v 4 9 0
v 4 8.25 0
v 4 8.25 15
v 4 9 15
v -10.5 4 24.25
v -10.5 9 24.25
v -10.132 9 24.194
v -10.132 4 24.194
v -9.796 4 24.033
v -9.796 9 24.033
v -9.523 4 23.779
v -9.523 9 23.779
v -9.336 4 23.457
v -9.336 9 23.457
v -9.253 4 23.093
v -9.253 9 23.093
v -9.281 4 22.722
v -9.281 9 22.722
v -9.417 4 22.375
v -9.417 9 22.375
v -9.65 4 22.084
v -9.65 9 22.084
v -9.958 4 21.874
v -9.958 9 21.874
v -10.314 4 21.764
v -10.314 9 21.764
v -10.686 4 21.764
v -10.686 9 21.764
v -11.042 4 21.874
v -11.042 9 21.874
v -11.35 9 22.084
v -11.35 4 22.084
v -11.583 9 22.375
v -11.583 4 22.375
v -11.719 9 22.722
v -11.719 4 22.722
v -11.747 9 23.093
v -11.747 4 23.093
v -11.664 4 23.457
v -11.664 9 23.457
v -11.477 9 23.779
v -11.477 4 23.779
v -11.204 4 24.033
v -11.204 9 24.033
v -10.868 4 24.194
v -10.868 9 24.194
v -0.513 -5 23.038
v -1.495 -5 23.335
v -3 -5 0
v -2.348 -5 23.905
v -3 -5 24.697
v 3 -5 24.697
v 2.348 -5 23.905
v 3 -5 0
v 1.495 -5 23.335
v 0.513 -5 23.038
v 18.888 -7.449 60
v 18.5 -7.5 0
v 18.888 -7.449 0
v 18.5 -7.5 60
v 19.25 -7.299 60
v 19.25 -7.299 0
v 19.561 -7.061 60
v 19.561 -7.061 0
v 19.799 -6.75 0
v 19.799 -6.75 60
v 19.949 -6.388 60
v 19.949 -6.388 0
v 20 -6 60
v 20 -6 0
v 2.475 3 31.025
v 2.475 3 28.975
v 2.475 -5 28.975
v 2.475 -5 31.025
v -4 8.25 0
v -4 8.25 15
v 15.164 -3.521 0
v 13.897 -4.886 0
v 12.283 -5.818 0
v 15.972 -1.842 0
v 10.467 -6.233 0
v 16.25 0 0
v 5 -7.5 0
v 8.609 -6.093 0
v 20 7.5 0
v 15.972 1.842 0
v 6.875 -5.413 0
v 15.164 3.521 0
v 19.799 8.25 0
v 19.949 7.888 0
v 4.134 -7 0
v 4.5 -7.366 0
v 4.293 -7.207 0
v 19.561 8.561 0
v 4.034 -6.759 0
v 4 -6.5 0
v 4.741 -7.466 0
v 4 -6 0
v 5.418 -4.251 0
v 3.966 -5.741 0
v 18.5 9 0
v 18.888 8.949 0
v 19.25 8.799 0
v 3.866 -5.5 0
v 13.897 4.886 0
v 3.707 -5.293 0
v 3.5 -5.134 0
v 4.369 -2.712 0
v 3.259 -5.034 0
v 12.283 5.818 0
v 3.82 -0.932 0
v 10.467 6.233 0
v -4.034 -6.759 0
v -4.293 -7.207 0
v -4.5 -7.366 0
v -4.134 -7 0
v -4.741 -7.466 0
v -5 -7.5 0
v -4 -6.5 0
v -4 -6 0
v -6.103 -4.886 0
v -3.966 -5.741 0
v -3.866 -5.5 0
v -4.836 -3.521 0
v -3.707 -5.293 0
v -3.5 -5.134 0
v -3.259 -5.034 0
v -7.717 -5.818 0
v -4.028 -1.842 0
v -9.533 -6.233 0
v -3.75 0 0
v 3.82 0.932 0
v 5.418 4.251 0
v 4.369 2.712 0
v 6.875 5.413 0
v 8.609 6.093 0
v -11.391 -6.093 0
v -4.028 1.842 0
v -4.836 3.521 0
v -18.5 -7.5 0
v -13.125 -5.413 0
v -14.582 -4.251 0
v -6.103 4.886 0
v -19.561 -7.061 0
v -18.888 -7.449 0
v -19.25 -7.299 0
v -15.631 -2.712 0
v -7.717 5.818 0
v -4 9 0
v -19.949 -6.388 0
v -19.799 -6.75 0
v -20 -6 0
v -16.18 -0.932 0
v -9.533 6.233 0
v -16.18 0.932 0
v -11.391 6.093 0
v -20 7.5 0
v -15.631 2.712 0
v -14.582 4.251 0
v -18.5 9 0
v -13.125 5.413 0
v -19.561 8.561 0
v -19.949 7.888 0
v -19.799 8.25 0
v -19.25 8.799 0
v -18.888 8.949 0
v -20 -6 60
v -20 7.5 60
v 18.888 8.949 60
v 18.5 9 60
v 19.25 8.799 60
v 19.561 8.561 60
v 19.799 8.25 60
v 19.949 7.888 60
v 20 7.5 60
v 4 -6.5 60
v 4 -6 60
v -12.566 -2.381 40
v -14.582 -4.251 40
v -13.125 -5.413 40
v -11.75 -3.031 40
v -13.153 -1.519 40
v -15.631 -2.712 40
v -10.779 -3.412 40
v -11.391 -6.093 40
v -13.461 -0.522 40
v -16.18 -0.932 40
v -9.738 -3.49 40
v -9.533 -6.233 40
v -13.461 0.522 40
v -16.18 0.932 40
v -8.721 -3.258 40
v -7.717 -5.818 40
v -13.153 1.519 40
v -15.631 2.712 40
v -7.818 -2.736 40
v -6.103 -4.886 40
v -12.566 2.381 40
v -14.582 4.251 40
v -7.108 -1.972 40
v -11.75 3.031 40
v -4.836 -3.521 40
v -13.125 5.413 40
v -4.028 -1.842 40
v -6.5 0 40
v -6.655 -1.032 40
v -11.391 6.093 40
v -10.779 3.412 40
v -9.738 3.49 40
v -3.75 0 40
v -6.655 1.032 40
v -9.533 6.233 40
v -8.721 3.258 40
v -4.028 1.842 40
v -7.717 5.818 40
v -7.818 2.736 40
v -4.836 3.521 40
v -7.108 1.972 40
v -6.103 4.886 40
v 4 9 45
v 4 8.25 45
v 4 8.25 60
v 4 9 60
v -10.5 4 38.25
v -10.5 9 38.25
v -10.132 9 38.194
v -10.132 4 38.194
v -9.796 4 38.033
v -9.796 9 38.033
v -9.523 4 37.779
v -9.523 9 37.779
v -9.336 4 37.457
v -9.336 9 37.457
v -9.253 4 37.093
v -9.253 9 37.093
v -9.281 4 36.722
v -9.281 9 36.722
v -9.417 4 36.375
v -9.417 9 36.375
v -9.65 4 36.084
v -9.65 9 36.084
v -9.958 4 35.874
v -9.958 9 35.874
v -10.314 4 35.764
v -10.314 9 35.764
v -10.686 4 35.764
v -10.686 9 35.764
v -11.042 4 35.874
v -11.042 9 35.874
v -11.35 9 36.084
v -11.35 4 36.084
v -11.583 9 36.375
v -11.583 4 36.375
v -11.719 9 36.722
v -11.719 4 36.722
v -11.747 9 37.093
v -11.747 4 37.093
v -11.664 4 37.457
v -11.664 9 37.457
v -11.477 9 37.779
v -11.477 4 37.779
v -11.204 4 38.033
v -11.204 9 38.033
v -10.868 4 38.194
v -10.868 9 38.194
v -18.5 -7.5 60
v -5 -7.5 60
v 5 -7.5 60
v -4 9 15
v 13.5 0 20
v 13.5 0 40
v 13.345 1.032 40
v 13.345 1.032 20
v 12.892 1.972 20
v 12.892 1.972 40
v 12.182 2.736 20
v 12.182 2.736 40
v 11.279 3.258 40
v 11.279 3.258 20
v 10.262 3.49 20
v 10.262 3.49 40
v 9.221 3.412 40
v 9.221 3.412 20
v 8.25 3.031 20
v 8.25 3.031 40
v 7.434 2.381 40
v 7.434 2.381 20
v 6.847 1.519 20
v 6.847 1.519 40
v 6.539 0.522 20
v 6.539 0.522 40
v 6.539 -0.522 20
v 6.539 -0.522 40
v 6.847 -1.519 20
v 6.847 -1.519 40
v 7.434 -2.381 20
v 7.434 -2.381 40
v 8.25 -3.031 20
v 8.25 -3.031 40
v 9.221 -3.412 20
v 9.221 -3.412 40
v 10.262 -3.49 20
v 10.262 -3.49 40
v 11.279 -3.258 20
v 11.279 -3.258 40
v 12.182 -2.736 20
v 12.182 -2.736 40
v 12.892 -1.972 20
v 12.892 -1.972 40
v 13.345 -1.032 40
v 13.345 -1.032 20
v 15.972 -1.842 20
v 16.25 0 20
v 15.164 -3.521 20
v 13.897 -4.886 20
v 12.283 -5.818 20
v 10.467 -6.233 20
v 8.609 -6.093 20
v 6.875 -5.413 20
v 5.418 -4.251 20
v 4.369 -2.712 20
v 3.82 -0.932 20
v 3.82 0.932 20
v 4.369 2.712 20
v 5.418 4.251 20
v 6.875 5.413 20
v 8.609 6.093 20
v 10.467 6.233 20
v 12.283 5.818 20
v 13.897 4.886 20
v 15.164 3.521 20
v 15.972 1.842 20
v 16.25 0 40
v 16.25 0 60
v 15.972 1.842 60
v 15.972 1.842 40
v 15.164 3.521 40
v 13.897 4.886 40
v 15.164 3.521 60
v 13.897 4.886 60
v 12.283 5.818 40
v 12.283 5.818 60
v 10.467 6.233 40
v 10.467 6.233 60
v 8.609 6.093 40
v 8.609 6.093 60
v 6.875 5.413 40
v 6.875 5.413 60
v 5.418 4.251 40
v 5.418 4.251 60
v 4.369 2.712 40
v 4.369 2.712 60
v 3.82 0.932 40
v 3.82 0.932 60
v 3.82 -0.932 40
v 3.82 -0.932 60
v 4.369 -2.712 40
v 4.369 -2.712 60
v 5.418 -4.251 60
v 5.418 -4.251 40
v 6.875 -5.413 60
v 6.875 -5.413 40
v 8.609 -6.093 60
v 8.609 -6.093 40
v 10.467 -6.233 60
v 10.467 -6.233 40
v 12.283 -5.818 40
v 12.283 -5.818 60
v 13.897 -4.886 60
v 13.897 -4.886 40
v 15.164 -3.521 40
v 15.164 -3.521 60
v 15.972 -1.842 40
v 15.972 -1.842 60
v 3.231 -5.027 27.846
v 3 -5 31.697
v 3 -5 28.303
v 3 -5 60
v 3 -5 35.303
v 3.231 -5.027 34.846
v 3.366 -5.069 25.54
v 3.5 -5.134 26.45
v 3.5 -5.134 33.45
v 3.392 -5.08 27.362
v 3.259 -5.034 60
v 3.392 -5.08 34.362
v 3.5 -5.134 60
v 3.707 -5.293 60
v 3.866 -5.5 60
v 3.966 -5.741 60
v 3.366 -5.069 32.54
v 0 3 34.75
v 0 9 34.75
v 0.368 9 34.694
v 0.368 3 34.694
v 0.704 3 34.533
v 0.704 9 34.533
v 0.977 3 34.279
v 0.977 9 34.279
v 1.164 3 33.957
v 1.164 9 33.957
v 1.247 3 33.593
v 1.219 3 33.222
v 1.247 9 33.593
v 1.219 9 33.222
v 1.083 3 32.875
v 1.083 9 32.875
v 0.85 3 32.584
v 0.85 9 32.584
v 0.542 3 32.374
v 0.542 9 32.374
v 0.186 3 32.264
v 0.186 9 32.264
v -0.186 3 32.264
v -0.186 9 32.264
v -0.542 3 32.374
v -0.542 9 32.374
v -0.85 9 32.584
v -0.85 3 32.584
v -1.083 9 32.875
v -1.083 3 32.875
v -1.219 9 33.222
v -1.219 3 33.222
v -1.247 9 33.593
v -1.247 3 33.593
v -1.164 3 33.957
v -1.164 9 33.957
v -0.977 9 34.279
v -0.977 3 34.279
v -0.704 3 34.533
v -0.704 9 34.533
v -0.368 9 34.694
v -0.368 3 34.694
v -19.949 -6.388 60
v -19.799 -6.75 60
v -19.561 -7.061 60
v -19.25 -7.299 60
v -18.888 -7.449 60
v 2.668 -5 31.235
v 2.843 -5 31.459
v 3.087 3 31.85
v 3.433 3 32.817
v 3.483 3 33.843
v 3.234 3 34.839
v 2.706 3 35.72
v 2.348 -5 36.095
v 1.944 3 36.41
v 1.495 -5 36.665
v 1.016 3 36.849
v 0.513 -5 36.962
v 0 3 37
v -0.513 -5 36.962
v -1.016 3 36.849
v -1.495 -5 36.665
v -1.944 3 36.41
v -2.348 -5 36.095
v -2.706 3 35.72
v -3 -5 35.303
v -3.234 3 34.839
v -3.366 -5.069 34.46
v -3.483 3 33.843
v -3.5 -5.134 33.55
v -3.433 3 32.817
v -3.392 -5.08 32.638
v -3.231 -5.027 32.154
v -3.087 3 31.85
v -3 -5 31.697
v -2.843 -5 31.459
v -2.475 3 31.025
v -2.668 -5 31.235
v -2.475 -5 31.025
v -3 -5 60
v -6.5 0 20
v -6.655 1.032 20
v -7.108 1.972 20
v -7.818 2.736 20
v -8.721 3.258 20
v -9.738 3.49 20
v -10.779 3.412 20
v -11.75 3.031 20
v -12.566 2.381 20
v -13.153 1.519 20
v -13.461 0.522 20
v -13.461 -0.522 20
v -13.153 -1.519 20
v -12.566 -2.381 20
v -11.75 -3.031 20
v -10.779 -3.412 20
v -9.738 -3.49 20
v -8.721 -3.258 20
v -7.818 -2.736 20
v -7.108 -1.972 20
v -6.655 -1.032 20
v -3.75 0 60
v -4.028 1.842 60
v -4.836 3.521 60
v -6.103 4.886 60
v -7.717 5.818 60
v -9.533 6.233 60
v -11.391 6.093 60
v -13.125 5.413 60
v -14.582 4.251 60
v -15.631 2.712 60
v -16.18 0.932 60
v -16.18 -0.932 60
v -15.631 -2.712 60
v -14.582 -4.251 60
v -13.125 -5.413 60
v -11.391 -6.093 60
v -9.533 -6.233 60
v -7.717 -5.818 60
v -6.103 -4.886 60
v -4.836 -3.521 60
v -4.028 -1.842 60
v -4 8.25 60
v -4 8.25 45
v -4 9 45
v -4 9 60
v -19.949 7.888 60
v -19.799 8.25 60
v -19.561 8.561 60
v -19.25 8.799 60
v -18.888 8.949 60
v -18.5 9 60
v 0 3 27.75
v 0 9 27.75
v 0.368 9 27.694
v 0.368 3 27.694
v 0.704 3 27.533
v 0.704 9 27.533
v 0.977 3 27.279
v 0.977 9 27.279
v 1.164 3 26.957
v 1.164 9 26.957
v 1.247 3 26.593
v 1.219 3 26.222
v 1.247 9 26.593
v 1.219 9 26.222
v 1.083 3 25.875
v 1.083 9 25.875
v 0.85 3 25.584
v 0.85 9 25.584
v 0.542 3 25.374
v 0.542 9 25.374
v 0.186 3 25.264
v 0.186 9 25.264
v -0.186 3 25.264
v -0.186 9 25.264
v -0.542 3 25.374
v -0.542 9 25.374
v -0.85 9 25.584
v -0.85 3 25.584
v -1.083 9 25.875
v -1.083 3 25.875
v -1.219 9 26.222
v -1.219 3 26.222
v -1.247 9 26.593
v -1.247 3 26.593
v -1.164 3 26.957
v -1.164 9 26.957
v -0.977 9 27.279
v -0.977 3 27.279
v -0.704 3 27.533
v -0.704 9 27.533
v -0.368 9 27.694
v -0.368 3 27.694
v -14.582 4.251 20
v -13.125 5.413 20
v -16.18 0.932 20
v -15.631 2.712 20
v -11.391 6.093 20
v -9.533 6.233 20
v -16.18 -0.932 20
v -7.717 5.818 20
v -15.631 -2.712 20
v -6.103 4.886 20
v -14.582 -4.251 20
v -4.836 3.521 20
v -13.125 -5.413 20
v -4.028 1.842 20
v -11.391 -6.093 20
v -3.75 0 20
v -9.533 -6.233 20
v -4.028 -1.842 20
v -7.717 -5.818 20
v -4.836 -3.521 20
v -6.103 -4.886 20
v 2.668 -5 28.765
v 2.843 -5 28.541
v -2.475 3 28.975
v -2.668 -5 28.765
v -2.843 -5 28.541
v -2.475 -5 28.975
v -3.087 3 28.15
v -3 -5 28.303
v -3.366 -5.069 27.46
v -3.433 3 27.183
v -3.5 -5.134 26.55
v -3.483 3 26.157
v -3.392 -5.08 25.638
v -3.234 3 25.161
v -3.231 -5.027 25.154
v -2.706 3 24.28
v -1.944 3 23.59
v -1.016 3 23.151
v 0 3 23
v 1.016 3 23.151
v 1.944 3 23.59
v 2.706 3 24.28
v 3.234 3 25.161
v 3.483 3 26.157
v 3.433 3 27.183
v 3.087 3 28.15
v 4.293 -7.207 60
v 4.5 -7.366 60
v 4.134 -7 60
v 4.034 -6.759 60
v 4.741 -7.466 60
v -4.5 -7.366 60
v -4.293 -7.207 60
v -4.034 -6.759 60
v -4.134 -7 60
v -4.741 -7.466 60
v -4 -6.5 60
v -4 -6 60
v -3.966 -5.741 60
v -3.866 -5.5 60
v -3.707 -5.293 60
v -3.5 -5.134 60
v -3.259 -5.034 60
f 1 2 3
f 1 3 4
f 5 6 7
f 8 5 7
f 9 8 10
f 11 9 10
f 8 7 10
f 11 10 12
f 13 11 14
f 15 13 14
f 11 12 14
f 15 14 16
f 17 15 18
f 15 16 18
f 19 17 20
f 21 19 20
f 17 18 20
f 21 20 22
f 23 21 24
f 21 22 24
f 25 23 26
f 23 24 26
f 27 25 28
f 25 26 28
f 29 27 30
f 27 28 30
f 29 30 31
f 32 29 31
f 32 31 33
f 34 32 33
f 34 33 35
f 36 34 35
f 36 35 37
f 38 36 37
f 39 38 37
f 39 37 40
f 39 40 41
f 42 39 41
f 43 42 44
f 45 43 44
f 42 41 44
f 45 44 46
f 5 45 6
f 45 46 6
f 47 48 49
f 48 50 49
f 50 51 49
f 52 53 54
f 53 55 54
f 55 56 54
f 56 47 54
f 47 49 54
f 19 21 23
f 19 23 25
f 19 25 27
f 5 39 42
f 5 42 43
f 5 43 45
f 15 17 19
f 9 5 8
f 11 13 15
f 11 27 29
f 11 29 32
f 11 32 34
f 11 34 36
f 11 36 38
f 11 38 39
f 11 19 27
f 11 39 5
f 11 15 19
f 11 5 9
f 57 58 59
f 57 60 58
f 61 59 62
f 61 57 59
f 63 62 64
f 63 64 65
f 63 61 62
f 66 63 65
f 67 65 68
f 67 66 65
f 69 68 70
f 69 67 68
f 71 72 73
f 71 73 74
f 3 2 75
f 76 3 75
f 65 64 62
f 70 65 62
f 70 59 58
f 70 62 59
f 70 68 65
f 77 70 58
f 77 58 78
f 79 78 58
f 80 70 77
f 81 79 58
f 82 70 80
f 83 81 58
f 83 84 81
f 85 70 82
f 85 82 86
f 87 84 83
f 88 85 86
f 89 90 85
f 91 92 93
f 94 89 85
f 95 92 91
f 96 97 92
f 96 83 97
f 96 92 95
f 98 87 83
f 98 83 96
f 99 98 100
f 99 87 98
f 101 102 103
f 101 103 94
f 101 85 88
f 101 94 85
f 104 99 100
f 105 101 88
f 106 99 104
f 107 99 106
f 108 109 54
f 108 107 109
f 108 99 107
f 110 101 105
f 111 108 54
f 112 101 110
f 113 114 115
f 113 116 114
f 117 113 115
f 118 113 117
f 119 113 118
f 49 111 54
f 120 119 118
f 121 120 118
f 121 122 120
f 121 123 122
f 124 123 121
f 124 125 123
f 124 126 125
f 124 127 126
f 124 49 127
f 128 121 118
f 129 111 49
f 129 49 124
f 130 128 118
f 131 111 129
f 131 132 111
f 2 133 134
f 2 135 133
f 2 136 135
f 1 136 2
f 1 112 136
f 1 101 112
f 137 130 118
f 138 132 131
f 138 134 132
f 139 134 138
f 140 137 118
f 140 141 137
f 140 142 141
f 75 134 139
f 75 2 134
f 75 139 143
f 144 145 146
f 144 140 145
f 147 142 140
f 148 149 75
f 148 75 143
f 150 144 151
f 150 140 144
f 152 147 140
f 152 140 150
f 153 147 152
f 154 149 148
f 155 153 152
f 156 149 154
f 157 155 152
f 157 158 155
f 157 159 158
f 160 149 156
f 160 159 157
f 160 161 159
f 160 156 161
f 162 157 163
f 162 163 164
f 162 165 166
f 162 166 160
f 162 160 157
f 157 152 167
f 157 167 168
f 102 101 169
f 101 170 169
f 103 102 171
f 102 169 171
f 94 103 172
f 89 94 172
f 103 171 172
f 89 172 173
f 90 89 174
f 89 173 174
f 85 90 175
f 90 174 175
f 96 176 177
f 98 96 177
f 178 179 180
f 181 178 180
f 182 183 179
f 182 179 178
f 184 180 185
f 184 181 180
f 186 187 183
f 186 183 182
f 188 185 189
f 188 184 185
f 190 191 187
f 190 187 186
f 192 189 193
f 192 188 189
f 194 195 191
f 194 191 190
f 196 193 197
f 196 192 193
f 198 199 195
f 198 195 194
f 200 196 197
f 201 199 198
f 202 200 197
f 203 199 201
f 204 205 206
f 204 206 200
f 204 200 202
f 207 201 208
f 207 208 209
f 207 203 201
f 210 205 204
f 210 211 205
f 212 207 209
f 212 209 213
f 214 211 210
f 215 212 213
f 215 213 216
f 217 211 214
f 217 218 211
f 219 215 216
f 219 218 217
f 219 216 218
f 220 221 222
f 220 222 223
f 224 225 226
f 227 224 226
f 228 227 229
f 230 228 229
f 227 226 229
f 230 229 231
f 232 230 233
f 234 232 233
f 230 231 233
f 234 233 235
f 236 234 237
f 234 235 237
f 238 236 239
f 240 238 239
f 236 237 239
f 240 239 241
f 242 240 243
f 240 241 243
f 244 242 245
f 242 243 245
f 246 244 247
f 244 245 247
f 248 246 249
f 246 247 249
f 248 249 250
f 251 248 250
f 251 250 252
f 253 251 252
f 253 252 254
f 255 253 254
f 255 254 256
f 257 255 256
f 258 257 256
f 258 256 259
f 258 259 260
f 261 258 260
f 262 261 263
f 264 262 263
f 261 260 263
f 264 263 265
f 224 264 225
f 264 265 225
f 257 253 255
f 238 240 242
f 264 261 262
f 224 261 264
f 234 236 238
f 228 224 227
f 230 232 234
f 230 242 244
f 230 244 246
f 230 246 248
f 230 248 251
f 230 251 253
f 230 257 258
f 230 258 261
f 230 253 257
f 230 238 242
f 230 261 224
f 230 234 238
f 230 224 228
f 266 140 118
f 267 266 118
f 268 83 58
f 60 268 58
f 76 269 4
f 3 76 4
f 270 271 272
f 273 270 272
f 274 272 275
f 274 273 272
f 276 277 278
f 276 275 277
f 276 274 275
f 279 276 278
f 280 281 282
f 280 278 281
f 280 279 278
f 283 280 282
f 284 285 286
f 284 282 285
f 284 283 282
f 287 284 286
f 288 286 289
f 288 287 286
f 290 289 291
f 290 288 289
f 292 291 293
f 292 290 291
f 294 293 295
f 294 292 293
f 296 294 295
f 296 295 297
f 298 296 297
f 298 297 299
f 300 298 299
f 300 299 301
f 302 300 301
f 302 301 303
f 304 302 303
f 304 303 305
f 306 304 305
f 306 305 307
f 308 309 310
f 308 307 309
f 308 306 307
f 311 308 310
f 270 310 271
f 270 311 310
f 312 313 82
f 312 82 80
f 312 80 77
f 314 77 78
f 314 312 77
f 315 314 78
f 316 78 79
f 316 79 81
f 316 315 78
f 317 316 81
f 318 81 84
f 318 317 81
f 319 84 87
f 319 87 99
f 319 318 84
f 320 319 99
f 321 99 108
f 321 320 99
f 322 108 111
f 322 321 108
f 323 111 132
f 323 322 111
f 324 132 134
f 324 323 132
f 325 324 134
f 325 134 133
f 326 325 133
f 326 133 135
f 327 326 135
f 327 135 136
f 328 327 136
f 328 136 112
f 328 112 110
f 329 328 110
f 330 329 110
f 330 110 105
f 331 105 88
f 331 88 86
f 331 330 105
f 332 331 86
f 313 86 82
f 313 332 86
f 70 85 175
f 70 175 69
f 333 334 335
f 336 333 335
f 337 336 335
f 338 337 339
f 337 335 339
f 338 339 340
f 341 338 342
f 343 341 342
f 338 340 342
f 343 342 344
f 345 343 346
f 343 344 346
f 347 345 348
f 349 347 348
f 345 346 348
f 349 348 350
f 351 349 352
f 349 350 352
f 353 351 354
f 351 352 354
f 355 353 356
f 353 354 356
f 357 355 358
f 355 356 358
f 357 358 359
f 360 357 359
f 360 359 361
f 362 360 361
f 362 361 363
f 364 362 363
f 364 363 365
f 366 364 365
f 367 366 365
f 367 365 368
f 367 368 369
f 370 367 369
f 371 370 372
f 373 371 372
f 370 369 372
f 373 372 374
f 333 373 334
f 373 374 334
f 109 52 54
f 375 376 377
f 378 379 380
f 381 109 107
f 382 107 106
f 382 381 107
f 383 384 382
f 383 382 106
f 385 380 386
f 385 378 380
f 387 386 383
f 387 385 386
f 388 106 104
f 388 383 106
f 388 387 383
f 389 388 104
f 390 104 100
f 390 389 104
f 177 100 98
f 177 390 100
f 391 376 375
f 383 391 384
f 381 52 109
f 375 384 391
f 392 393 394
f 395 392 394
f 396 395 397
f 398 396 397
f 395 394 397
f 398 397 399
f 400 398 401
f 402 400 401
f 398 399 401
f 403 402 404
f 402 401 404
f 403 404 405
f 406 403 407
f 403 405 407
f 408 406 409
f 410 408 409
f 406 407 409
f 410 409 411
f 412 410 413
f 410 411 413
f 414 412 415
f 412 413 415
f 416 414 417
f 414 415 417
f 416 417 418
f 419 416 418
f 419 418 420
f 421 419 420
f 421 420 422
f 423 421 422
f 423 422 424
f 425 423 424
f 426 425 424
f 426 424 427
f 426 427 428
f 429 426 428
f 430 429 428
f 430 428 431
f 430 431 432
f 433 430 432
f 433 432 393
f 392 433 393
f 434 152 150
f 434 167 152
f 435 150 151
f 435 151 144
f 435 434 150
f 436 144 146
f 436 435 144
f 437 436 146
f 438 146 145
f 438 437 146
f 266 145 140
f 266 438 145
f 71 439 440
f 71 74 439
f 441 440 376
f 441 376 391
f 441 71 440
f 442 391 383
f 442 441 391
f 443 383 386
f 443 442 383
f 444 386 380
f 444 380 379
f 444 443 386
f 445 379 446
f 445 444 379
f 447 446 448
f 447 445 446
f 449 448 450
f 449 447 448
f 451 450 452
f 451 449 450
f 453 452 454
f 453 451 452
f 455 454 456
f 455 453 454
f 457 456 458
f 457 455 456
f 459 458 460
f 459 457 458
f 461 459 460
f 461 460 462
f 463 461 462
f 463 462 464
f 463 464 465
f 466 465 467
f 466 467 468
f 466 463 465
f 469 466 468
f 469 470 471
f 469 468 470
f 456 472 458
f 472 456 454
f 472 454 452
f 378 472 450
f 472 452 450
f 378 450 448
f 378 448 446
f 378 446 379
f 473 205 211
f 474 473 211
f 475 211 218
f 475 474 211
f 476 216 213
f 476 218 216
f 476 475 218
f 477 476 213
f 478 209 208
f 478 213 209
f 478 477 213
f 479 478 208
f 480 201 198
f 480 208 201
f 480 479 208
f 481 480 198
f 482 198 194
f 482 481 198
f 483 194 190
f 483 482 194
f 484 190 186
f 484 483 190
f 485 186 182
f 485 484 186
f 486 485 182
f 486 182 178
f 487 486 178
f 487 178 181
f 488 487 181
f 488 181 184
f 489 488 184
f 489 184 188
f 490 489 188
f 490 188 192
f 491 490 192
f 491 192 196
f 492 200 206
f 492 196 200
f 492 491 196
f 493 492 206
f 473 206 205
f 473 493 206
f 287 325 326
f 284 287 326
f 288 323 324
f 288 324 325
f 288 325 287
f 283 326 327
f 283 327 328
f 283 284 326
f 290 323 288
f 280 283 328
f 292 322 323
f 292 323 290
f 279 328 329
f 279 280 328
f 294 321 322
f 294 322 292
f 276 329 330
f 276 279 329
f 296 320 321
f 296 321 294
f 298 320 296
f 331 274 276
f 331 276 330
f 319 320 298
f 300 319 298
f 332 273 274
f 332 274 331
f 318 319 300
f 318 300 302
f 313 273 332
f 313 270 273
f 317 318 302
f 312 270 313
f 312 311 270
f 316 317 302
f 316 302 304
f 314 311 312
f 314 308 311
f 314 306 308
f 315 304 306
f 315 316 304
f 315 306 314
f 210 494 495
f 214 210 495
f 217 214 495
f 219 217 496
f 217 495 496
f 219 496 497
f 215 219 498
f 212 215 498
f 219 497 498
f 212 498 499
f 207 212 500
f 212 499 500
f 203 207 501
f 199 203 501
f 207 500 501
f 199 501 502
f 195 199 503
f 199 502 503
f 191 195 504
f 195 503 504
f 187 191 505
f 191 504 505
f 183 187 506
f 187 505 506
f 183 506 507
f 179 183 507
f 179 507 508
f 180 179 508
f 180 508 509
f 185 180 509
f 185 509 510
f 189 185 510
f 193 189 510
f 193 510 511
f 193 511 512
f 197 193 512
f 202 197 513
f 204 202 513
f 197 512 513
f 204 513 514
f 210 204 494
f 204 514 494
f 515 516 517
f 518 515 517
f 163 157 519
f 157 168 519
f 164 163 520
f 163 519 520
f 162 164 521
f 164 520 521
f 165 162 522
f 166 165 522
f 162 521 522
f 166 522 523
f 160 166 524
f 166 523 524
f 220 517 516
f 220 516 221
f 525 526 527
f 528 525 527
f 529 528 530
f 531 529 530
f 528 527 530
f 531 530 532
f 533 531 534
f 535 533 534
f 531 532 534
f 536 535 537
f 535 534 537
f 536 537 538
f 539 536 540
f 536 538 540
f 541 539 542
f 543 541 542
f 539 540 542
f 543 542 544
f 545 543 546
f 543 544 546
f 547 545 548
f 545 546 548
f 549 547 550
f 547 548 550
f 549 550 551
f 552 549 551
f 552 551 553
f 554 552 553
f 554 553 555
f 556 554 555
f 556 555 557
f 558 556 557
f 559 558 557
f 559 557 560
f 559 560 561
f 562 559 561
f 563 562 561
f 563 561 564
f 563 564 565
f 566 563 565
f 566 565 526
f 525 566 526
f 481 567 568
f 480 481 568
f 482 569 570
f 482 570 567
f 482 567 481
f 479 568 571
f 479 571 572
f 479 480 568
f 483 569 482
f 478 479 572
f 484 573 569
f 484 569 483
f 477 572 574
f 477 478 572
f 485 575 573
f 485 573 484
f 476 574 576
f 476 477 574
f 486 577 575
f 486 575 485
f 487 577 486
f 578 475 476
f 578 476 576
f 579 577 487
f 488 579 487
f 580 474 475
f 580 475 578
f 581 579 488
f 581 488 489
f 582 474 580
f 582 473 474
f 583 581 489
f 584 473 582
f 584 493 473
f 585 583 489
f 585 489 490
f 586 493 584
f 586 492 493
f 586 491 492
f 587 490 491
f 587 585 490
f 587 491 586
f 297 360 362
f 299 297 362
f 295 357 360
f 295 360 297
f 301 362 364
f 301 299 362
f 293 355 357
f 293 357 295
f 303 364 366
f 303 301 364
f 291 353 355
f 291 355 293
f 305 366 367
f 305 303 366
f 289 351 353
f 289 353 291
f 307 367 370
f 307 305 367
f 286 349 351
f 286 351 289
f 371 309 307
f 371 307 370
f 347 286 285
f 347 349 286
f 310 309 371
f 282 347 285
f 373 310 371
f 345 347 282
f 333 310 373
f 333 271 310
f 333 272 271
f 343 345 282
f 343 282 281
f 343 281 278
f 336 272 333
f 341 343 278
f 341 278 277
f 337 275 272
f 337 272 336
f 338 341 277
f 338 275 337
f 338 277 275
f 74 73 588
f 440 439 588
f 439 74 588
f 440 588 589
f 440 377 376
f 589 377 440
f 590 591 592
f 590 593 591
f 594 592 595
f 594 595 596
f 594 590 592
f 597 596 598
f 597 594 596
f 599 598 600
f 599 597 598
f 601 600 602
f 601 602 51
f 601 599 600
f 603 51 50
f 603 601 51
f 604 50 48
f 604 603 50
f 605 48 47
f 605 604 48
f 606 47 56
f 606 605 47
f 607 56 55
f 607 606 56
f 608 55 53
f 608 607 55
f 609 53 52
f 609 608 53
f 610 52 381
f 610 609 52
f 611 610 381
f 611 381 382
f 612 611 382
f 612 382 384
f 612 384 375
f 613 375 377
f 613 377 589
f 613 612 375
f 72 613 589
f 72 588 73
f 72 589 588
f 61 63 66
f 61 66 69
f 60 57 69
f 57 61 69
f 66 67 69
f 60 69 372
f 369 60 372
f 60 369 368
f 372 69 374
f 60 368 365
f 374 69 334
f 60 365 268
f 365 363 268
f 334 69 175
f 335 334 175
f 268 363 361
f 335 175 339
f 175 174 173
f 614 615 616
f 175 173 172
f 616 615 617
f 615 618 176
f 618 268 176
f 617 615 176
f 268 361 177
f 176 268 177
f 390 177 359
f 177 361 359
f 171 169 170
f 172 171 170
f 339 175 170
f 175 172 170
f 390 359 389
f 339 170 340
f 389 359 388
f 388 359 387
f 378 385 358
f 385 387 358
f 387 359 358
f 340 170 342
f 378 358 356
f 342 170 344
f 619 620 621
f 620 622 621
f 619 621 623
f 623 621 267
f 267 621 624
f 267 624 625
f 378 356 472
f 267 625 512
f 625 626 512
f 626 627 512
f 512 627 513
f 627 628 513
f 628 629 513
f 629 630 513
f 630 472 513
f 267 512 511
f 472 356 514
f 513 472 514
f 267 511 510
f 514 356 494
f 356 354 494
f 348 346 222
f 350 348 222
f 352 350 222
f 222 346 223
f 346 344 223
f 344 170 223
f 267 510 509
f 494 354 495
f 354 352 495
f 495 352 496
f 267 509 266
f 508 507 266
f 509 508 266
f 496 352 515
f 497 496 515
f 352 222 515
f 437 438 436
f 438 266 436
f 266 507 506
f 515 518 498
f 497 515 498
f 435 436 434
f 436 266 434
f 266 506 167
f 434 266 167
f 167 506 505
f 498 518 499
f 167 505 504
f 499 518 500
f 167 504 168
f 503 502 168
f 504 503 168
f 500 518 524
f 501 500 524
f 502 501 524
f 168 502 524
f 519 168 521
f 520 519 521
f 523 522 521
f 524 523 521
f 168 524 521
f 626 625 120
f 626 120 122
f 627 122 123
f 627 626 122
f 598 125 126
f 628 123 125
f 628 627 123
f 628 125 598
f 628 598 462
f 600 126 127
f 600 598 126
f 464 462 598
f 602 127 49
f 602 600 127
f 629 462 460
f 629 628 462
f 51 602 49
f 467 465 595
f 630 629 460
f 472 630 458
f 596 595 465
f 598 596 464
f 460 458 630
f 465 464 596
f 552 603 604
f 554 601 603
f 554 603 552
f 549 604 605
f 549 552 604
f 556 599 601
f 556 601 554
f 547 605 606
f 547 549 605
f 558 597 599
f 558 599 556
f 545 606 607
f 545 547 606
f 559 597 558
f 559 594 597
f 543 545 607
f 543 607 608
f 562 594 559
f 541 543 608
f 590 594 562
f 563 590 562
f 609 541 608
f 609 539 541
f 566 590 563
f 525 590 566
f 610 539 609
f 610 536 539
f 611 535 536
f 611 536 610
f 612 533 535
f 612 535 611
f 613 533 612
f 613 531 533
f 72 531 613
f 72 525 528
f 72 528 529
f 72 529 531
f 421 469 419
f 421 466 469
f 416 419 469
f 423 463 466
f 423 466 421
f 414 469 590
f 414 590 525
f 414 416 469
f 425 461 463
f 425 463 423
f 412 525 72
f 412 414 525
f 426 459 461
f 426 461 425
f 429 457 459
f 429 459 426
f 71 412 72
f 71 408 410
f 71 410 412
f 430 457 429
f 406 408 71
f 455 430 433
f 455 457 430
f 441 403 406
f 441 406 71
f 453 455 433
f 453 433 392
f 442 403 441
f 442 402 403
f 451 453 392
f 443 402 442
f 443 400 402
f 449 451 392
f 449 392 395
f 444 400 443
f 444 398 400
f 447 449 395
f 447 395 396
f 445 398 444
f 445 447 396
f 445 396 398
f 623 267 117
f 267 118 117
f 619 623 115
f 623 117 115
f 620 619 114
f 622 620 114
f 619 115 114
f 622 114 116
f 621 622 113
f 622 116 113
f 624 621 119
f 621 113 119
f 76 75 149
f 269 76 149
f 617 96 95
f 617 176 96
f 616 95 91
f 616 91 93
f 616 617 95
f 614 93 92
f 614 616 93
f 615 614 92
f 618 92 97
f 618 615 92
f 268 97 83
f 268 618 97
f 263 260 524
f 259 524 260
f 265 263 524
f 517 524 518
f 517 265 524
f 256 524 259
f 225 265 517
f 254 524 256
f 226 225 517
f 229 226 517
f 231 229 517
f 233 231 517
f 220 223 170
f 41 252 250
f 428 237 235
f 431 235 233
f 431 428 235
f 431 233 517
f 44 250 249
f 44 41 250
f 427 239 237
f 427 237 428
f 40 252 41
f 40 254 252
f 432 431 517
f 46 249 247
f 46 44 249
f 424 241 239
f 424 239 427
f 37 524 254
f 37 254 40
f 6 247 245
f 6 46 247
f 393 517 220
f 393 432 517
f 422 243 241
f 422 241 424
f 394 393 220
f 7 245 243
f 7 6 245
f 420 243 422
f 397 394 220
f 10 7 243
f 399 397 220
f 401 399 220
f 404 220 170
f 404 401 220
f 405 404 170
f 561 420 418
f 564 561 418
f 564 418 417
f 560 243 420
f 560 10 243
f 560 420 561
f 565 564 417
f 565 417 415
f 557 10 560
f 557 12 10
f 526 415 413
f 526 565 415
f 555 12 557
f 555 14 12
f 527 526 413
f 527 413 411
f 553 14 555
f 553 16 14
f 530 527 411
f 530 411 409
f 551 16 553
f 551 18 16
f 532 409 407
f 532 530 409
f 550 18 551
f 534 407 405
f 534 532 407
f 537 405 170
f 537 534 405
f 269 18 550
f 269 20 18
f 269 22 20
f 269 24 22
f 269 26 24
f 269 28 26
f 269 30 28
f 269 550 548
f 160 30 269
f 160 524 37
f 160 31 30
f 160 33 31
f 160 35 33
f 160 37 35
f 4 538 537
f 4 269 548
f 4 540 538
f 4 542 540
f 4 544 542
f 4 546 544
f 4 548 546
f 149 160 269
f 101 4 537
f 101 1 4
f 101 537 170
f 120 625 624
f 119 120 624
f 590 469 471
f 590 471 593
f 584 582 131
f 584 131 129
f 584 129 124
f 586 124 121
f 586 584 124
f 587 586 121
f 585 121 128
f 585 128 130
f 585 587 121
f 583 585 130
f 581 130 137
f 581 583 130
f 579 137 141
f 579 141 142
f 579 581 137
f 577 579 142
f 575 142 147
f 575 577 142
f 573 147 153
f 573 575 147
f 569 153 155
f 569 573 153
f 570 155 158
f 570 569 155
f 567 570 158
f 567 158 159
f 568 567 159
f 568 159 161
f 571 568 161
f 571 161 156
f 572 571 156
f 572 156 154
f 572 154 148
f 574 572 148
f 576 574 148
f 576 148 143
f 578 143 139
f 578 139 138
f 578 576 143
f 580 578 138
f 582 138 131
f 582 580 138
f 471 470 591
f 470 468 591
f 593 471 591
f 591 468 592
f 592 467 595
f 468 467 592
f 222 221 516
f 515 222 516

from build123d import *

# Parameters (mm, degrees)
SKETCH_1_R               = 3.5
EXTRUDE_1_DEPTH          = 60
FILLET_1_R               = 1.5
SKETCH_2_R               = 6.25
CUT_EXTRUDE_1_DEPTH      = 20
CUT_EXTRUDE_START        = -20
SKETCH_3_R               = 6.25
CUT_EXTRUDE_2_DEPTH      = 20
SKETCH_5_W               = 8
SKETCH_5_H               = 0.75
CUT_EXTRUDE_4_DEPTH      = 62
FILLET_2_R               = 1
SKETCH_7_W               = 8
SKETCH_7_H               = 30
EXTRUDE_2_DEPTH          = 2
SKETCH_6_R               = 1.25
CUT_EXTRUDE_5_DEPTH      = 62
SKETCH_8_R               = 1.25
CUT_EXTRUDE_6_DEPTH      = 5
CUT_EXTRUDE_9_DEPTH      = 5
CUT_EXTRUDE_9_DEPTH_BACK = 8


with BuildPart() as part:
    # 草图1 → 凸台-拉伸1 (new body)
    with BuildSketch(Plane.XY):
        Polygon((-20, -7.5), (-20, 9), (20, 9), (20, -7.5), (0, -7.5), align=None)
        with Locations((-10, 0)):
            Circle(SKETCH_1_R, mode=Mode.SUBTRACT)
        with Locations((10, 0)):
            Circle(SKETCH_1_R, mode=Mode.SUBTRACT)
    extrude(amount=EXTRUDE_1_DEPTH)

    # 圆角1
    fillet_1_edges = [part.edges().sort_by_distance(p)[0] for p in [
        (-20, -7.5, 30),
        (-20, 9, 30),
        (20, 9, 30),
        (20, -7.5, 30),
    ]]
    fillet(fillet_1_edges, radius=FILLET_1_R)

    # 草图2 → 切除-拉伸1 (cut)
    with BuildSketch(Plane.XY.offset(60)):
        with Locations((10, 0)):
            Circle(SKETCH_2_R)
        with Locations((-10, 0)):
            Circle(SKETCH_2_R)
    extrude(amount=-CUT_EXTRUDE_1_DEPTH, mode=Mode.SUBTRACT)

    # 草图3 → 切除-拉伸2 (cut)
    with BuildSketch(Plane(origin=(0, 0, 0), x_dir=(-1, 0, 0), z_dir=(0, 0, -1)).offset(CUT_EXTRUDE_START)):
        with Locations(Location((-10, 0, 0), (0, 0, 180))):
            Circle(SKETCH_3_R)
        with Locations(Location((10, 0, 0), (0, 0, 180))):
            Circle(SKETCH_3_R)
    extrude(amount=CUT_EXTRUDE_2_DEPTH, mode=Mode.SUBTRACT)

    # 草图5 → 切除-拉伸4 (cut)
    with BuildSketch(Plane(origin=(0, 0, 0), x_dir=(-1, 0, 0), z_dir=(0, 0, -1))):
        Polygon((0, -5), (4, -5), (4, -9), (-4, -9), (-4, -5), align=None)
        with Locations((0, 8.625)):
            Rectangle(SKETCH_5_W, SKETCH_5_H)
    extrude(amount=-CUT_EXTRUDE_4_DEPTH, mode=Mode.SUBTRACT)

    # 圆角2
    fillet_2_edges = [part.edges().sort_by_distance(p)[0] for p in [
        (4, -7.5, 30),
        (-4, -7.5, 30),
        (4, -5, 30),
        (-4, -5, 30),
    ]]
    fillet(fillet_2_edges, radius=FILLET_2_R)

    # 草图7 → 凸台-拉伸2 (add)
    with BuildSketch(Plane(origin=(0, 9, 0), x_dir=(1, 0, 0), z_dir=(0, 1, 0))):
        with Locations((0, -30)):
            Rectangle(SKETCH_7_W, SKETCH_7_H)
    extrude(amount=-EXTRUDE_2_DEPTH)

    # 草图6 → 切除-拉伸5 (cut)
    with BuildSketch(Plane(origin=(0, 9, 0), x_dir=(1, 0, 0), z_dir=(0, 1, 0))):
        with Locations(Location((0, -26.5, 0), (0, 0, 270))):
            Circle(SKETCH_6_R)
        with Locations(Location((0, -33.5, 0), (0, 0, 270))):
            Circle(SKETCH_6_R)
    extrude(amount=-CUT_EXTRUDE_5_DEPTH, mode=Mode.SUBTRACT)

    # 草图8 → 切除-拉伸6 (cut)
    with BuildSketch(Plane(origin=(0, 9, 0), x_dir=(1, 0, 0), z_dir=(0, 1, 0))):
        with Locations(Location((-10.5, -23, 0), (0, 0, 270))):
            Circle(SKETCH_8_R)
        with Locations(Location((-10.5, -37, 0), (0, 0, 270))):
            Circle(SKETCH_8_R)
    extrude(amount=-CUT_EXTRUDE_6_DEPTH, mode=Mode.SUBTRACT)

    # 草图9 → 切除-拉伸9 (cut, two sides: drawn at the far end of the back side and taken through both)
    with BuildSketch(Plane.XZ.offset(5).offset(-CUT_EXTRUDE_9_DEPTH_BACK)):
        with BuildLine():
            Line((2.474873734, 28.974873734), (2.474873734, 31.025126266))
            ThreePointArc((2.474873734, 31.025126266), (0, 37), (-2.474873734, 31.025126266))
            Line((-2.474873734, 31.025126266), (-2.474873734, 28.974873734))
            ThreePointArc((-2.474873734, 28.974873734), (0, 23), (2.474873734, 28.974873734))
        make_face()
    extrude(amount=CUT_EXTRUDE_9_DEPTH + CUT_EXTRUDE_9_DEPTH_BACK, mode=Mode.SUBTRACT)


solid = part.part
